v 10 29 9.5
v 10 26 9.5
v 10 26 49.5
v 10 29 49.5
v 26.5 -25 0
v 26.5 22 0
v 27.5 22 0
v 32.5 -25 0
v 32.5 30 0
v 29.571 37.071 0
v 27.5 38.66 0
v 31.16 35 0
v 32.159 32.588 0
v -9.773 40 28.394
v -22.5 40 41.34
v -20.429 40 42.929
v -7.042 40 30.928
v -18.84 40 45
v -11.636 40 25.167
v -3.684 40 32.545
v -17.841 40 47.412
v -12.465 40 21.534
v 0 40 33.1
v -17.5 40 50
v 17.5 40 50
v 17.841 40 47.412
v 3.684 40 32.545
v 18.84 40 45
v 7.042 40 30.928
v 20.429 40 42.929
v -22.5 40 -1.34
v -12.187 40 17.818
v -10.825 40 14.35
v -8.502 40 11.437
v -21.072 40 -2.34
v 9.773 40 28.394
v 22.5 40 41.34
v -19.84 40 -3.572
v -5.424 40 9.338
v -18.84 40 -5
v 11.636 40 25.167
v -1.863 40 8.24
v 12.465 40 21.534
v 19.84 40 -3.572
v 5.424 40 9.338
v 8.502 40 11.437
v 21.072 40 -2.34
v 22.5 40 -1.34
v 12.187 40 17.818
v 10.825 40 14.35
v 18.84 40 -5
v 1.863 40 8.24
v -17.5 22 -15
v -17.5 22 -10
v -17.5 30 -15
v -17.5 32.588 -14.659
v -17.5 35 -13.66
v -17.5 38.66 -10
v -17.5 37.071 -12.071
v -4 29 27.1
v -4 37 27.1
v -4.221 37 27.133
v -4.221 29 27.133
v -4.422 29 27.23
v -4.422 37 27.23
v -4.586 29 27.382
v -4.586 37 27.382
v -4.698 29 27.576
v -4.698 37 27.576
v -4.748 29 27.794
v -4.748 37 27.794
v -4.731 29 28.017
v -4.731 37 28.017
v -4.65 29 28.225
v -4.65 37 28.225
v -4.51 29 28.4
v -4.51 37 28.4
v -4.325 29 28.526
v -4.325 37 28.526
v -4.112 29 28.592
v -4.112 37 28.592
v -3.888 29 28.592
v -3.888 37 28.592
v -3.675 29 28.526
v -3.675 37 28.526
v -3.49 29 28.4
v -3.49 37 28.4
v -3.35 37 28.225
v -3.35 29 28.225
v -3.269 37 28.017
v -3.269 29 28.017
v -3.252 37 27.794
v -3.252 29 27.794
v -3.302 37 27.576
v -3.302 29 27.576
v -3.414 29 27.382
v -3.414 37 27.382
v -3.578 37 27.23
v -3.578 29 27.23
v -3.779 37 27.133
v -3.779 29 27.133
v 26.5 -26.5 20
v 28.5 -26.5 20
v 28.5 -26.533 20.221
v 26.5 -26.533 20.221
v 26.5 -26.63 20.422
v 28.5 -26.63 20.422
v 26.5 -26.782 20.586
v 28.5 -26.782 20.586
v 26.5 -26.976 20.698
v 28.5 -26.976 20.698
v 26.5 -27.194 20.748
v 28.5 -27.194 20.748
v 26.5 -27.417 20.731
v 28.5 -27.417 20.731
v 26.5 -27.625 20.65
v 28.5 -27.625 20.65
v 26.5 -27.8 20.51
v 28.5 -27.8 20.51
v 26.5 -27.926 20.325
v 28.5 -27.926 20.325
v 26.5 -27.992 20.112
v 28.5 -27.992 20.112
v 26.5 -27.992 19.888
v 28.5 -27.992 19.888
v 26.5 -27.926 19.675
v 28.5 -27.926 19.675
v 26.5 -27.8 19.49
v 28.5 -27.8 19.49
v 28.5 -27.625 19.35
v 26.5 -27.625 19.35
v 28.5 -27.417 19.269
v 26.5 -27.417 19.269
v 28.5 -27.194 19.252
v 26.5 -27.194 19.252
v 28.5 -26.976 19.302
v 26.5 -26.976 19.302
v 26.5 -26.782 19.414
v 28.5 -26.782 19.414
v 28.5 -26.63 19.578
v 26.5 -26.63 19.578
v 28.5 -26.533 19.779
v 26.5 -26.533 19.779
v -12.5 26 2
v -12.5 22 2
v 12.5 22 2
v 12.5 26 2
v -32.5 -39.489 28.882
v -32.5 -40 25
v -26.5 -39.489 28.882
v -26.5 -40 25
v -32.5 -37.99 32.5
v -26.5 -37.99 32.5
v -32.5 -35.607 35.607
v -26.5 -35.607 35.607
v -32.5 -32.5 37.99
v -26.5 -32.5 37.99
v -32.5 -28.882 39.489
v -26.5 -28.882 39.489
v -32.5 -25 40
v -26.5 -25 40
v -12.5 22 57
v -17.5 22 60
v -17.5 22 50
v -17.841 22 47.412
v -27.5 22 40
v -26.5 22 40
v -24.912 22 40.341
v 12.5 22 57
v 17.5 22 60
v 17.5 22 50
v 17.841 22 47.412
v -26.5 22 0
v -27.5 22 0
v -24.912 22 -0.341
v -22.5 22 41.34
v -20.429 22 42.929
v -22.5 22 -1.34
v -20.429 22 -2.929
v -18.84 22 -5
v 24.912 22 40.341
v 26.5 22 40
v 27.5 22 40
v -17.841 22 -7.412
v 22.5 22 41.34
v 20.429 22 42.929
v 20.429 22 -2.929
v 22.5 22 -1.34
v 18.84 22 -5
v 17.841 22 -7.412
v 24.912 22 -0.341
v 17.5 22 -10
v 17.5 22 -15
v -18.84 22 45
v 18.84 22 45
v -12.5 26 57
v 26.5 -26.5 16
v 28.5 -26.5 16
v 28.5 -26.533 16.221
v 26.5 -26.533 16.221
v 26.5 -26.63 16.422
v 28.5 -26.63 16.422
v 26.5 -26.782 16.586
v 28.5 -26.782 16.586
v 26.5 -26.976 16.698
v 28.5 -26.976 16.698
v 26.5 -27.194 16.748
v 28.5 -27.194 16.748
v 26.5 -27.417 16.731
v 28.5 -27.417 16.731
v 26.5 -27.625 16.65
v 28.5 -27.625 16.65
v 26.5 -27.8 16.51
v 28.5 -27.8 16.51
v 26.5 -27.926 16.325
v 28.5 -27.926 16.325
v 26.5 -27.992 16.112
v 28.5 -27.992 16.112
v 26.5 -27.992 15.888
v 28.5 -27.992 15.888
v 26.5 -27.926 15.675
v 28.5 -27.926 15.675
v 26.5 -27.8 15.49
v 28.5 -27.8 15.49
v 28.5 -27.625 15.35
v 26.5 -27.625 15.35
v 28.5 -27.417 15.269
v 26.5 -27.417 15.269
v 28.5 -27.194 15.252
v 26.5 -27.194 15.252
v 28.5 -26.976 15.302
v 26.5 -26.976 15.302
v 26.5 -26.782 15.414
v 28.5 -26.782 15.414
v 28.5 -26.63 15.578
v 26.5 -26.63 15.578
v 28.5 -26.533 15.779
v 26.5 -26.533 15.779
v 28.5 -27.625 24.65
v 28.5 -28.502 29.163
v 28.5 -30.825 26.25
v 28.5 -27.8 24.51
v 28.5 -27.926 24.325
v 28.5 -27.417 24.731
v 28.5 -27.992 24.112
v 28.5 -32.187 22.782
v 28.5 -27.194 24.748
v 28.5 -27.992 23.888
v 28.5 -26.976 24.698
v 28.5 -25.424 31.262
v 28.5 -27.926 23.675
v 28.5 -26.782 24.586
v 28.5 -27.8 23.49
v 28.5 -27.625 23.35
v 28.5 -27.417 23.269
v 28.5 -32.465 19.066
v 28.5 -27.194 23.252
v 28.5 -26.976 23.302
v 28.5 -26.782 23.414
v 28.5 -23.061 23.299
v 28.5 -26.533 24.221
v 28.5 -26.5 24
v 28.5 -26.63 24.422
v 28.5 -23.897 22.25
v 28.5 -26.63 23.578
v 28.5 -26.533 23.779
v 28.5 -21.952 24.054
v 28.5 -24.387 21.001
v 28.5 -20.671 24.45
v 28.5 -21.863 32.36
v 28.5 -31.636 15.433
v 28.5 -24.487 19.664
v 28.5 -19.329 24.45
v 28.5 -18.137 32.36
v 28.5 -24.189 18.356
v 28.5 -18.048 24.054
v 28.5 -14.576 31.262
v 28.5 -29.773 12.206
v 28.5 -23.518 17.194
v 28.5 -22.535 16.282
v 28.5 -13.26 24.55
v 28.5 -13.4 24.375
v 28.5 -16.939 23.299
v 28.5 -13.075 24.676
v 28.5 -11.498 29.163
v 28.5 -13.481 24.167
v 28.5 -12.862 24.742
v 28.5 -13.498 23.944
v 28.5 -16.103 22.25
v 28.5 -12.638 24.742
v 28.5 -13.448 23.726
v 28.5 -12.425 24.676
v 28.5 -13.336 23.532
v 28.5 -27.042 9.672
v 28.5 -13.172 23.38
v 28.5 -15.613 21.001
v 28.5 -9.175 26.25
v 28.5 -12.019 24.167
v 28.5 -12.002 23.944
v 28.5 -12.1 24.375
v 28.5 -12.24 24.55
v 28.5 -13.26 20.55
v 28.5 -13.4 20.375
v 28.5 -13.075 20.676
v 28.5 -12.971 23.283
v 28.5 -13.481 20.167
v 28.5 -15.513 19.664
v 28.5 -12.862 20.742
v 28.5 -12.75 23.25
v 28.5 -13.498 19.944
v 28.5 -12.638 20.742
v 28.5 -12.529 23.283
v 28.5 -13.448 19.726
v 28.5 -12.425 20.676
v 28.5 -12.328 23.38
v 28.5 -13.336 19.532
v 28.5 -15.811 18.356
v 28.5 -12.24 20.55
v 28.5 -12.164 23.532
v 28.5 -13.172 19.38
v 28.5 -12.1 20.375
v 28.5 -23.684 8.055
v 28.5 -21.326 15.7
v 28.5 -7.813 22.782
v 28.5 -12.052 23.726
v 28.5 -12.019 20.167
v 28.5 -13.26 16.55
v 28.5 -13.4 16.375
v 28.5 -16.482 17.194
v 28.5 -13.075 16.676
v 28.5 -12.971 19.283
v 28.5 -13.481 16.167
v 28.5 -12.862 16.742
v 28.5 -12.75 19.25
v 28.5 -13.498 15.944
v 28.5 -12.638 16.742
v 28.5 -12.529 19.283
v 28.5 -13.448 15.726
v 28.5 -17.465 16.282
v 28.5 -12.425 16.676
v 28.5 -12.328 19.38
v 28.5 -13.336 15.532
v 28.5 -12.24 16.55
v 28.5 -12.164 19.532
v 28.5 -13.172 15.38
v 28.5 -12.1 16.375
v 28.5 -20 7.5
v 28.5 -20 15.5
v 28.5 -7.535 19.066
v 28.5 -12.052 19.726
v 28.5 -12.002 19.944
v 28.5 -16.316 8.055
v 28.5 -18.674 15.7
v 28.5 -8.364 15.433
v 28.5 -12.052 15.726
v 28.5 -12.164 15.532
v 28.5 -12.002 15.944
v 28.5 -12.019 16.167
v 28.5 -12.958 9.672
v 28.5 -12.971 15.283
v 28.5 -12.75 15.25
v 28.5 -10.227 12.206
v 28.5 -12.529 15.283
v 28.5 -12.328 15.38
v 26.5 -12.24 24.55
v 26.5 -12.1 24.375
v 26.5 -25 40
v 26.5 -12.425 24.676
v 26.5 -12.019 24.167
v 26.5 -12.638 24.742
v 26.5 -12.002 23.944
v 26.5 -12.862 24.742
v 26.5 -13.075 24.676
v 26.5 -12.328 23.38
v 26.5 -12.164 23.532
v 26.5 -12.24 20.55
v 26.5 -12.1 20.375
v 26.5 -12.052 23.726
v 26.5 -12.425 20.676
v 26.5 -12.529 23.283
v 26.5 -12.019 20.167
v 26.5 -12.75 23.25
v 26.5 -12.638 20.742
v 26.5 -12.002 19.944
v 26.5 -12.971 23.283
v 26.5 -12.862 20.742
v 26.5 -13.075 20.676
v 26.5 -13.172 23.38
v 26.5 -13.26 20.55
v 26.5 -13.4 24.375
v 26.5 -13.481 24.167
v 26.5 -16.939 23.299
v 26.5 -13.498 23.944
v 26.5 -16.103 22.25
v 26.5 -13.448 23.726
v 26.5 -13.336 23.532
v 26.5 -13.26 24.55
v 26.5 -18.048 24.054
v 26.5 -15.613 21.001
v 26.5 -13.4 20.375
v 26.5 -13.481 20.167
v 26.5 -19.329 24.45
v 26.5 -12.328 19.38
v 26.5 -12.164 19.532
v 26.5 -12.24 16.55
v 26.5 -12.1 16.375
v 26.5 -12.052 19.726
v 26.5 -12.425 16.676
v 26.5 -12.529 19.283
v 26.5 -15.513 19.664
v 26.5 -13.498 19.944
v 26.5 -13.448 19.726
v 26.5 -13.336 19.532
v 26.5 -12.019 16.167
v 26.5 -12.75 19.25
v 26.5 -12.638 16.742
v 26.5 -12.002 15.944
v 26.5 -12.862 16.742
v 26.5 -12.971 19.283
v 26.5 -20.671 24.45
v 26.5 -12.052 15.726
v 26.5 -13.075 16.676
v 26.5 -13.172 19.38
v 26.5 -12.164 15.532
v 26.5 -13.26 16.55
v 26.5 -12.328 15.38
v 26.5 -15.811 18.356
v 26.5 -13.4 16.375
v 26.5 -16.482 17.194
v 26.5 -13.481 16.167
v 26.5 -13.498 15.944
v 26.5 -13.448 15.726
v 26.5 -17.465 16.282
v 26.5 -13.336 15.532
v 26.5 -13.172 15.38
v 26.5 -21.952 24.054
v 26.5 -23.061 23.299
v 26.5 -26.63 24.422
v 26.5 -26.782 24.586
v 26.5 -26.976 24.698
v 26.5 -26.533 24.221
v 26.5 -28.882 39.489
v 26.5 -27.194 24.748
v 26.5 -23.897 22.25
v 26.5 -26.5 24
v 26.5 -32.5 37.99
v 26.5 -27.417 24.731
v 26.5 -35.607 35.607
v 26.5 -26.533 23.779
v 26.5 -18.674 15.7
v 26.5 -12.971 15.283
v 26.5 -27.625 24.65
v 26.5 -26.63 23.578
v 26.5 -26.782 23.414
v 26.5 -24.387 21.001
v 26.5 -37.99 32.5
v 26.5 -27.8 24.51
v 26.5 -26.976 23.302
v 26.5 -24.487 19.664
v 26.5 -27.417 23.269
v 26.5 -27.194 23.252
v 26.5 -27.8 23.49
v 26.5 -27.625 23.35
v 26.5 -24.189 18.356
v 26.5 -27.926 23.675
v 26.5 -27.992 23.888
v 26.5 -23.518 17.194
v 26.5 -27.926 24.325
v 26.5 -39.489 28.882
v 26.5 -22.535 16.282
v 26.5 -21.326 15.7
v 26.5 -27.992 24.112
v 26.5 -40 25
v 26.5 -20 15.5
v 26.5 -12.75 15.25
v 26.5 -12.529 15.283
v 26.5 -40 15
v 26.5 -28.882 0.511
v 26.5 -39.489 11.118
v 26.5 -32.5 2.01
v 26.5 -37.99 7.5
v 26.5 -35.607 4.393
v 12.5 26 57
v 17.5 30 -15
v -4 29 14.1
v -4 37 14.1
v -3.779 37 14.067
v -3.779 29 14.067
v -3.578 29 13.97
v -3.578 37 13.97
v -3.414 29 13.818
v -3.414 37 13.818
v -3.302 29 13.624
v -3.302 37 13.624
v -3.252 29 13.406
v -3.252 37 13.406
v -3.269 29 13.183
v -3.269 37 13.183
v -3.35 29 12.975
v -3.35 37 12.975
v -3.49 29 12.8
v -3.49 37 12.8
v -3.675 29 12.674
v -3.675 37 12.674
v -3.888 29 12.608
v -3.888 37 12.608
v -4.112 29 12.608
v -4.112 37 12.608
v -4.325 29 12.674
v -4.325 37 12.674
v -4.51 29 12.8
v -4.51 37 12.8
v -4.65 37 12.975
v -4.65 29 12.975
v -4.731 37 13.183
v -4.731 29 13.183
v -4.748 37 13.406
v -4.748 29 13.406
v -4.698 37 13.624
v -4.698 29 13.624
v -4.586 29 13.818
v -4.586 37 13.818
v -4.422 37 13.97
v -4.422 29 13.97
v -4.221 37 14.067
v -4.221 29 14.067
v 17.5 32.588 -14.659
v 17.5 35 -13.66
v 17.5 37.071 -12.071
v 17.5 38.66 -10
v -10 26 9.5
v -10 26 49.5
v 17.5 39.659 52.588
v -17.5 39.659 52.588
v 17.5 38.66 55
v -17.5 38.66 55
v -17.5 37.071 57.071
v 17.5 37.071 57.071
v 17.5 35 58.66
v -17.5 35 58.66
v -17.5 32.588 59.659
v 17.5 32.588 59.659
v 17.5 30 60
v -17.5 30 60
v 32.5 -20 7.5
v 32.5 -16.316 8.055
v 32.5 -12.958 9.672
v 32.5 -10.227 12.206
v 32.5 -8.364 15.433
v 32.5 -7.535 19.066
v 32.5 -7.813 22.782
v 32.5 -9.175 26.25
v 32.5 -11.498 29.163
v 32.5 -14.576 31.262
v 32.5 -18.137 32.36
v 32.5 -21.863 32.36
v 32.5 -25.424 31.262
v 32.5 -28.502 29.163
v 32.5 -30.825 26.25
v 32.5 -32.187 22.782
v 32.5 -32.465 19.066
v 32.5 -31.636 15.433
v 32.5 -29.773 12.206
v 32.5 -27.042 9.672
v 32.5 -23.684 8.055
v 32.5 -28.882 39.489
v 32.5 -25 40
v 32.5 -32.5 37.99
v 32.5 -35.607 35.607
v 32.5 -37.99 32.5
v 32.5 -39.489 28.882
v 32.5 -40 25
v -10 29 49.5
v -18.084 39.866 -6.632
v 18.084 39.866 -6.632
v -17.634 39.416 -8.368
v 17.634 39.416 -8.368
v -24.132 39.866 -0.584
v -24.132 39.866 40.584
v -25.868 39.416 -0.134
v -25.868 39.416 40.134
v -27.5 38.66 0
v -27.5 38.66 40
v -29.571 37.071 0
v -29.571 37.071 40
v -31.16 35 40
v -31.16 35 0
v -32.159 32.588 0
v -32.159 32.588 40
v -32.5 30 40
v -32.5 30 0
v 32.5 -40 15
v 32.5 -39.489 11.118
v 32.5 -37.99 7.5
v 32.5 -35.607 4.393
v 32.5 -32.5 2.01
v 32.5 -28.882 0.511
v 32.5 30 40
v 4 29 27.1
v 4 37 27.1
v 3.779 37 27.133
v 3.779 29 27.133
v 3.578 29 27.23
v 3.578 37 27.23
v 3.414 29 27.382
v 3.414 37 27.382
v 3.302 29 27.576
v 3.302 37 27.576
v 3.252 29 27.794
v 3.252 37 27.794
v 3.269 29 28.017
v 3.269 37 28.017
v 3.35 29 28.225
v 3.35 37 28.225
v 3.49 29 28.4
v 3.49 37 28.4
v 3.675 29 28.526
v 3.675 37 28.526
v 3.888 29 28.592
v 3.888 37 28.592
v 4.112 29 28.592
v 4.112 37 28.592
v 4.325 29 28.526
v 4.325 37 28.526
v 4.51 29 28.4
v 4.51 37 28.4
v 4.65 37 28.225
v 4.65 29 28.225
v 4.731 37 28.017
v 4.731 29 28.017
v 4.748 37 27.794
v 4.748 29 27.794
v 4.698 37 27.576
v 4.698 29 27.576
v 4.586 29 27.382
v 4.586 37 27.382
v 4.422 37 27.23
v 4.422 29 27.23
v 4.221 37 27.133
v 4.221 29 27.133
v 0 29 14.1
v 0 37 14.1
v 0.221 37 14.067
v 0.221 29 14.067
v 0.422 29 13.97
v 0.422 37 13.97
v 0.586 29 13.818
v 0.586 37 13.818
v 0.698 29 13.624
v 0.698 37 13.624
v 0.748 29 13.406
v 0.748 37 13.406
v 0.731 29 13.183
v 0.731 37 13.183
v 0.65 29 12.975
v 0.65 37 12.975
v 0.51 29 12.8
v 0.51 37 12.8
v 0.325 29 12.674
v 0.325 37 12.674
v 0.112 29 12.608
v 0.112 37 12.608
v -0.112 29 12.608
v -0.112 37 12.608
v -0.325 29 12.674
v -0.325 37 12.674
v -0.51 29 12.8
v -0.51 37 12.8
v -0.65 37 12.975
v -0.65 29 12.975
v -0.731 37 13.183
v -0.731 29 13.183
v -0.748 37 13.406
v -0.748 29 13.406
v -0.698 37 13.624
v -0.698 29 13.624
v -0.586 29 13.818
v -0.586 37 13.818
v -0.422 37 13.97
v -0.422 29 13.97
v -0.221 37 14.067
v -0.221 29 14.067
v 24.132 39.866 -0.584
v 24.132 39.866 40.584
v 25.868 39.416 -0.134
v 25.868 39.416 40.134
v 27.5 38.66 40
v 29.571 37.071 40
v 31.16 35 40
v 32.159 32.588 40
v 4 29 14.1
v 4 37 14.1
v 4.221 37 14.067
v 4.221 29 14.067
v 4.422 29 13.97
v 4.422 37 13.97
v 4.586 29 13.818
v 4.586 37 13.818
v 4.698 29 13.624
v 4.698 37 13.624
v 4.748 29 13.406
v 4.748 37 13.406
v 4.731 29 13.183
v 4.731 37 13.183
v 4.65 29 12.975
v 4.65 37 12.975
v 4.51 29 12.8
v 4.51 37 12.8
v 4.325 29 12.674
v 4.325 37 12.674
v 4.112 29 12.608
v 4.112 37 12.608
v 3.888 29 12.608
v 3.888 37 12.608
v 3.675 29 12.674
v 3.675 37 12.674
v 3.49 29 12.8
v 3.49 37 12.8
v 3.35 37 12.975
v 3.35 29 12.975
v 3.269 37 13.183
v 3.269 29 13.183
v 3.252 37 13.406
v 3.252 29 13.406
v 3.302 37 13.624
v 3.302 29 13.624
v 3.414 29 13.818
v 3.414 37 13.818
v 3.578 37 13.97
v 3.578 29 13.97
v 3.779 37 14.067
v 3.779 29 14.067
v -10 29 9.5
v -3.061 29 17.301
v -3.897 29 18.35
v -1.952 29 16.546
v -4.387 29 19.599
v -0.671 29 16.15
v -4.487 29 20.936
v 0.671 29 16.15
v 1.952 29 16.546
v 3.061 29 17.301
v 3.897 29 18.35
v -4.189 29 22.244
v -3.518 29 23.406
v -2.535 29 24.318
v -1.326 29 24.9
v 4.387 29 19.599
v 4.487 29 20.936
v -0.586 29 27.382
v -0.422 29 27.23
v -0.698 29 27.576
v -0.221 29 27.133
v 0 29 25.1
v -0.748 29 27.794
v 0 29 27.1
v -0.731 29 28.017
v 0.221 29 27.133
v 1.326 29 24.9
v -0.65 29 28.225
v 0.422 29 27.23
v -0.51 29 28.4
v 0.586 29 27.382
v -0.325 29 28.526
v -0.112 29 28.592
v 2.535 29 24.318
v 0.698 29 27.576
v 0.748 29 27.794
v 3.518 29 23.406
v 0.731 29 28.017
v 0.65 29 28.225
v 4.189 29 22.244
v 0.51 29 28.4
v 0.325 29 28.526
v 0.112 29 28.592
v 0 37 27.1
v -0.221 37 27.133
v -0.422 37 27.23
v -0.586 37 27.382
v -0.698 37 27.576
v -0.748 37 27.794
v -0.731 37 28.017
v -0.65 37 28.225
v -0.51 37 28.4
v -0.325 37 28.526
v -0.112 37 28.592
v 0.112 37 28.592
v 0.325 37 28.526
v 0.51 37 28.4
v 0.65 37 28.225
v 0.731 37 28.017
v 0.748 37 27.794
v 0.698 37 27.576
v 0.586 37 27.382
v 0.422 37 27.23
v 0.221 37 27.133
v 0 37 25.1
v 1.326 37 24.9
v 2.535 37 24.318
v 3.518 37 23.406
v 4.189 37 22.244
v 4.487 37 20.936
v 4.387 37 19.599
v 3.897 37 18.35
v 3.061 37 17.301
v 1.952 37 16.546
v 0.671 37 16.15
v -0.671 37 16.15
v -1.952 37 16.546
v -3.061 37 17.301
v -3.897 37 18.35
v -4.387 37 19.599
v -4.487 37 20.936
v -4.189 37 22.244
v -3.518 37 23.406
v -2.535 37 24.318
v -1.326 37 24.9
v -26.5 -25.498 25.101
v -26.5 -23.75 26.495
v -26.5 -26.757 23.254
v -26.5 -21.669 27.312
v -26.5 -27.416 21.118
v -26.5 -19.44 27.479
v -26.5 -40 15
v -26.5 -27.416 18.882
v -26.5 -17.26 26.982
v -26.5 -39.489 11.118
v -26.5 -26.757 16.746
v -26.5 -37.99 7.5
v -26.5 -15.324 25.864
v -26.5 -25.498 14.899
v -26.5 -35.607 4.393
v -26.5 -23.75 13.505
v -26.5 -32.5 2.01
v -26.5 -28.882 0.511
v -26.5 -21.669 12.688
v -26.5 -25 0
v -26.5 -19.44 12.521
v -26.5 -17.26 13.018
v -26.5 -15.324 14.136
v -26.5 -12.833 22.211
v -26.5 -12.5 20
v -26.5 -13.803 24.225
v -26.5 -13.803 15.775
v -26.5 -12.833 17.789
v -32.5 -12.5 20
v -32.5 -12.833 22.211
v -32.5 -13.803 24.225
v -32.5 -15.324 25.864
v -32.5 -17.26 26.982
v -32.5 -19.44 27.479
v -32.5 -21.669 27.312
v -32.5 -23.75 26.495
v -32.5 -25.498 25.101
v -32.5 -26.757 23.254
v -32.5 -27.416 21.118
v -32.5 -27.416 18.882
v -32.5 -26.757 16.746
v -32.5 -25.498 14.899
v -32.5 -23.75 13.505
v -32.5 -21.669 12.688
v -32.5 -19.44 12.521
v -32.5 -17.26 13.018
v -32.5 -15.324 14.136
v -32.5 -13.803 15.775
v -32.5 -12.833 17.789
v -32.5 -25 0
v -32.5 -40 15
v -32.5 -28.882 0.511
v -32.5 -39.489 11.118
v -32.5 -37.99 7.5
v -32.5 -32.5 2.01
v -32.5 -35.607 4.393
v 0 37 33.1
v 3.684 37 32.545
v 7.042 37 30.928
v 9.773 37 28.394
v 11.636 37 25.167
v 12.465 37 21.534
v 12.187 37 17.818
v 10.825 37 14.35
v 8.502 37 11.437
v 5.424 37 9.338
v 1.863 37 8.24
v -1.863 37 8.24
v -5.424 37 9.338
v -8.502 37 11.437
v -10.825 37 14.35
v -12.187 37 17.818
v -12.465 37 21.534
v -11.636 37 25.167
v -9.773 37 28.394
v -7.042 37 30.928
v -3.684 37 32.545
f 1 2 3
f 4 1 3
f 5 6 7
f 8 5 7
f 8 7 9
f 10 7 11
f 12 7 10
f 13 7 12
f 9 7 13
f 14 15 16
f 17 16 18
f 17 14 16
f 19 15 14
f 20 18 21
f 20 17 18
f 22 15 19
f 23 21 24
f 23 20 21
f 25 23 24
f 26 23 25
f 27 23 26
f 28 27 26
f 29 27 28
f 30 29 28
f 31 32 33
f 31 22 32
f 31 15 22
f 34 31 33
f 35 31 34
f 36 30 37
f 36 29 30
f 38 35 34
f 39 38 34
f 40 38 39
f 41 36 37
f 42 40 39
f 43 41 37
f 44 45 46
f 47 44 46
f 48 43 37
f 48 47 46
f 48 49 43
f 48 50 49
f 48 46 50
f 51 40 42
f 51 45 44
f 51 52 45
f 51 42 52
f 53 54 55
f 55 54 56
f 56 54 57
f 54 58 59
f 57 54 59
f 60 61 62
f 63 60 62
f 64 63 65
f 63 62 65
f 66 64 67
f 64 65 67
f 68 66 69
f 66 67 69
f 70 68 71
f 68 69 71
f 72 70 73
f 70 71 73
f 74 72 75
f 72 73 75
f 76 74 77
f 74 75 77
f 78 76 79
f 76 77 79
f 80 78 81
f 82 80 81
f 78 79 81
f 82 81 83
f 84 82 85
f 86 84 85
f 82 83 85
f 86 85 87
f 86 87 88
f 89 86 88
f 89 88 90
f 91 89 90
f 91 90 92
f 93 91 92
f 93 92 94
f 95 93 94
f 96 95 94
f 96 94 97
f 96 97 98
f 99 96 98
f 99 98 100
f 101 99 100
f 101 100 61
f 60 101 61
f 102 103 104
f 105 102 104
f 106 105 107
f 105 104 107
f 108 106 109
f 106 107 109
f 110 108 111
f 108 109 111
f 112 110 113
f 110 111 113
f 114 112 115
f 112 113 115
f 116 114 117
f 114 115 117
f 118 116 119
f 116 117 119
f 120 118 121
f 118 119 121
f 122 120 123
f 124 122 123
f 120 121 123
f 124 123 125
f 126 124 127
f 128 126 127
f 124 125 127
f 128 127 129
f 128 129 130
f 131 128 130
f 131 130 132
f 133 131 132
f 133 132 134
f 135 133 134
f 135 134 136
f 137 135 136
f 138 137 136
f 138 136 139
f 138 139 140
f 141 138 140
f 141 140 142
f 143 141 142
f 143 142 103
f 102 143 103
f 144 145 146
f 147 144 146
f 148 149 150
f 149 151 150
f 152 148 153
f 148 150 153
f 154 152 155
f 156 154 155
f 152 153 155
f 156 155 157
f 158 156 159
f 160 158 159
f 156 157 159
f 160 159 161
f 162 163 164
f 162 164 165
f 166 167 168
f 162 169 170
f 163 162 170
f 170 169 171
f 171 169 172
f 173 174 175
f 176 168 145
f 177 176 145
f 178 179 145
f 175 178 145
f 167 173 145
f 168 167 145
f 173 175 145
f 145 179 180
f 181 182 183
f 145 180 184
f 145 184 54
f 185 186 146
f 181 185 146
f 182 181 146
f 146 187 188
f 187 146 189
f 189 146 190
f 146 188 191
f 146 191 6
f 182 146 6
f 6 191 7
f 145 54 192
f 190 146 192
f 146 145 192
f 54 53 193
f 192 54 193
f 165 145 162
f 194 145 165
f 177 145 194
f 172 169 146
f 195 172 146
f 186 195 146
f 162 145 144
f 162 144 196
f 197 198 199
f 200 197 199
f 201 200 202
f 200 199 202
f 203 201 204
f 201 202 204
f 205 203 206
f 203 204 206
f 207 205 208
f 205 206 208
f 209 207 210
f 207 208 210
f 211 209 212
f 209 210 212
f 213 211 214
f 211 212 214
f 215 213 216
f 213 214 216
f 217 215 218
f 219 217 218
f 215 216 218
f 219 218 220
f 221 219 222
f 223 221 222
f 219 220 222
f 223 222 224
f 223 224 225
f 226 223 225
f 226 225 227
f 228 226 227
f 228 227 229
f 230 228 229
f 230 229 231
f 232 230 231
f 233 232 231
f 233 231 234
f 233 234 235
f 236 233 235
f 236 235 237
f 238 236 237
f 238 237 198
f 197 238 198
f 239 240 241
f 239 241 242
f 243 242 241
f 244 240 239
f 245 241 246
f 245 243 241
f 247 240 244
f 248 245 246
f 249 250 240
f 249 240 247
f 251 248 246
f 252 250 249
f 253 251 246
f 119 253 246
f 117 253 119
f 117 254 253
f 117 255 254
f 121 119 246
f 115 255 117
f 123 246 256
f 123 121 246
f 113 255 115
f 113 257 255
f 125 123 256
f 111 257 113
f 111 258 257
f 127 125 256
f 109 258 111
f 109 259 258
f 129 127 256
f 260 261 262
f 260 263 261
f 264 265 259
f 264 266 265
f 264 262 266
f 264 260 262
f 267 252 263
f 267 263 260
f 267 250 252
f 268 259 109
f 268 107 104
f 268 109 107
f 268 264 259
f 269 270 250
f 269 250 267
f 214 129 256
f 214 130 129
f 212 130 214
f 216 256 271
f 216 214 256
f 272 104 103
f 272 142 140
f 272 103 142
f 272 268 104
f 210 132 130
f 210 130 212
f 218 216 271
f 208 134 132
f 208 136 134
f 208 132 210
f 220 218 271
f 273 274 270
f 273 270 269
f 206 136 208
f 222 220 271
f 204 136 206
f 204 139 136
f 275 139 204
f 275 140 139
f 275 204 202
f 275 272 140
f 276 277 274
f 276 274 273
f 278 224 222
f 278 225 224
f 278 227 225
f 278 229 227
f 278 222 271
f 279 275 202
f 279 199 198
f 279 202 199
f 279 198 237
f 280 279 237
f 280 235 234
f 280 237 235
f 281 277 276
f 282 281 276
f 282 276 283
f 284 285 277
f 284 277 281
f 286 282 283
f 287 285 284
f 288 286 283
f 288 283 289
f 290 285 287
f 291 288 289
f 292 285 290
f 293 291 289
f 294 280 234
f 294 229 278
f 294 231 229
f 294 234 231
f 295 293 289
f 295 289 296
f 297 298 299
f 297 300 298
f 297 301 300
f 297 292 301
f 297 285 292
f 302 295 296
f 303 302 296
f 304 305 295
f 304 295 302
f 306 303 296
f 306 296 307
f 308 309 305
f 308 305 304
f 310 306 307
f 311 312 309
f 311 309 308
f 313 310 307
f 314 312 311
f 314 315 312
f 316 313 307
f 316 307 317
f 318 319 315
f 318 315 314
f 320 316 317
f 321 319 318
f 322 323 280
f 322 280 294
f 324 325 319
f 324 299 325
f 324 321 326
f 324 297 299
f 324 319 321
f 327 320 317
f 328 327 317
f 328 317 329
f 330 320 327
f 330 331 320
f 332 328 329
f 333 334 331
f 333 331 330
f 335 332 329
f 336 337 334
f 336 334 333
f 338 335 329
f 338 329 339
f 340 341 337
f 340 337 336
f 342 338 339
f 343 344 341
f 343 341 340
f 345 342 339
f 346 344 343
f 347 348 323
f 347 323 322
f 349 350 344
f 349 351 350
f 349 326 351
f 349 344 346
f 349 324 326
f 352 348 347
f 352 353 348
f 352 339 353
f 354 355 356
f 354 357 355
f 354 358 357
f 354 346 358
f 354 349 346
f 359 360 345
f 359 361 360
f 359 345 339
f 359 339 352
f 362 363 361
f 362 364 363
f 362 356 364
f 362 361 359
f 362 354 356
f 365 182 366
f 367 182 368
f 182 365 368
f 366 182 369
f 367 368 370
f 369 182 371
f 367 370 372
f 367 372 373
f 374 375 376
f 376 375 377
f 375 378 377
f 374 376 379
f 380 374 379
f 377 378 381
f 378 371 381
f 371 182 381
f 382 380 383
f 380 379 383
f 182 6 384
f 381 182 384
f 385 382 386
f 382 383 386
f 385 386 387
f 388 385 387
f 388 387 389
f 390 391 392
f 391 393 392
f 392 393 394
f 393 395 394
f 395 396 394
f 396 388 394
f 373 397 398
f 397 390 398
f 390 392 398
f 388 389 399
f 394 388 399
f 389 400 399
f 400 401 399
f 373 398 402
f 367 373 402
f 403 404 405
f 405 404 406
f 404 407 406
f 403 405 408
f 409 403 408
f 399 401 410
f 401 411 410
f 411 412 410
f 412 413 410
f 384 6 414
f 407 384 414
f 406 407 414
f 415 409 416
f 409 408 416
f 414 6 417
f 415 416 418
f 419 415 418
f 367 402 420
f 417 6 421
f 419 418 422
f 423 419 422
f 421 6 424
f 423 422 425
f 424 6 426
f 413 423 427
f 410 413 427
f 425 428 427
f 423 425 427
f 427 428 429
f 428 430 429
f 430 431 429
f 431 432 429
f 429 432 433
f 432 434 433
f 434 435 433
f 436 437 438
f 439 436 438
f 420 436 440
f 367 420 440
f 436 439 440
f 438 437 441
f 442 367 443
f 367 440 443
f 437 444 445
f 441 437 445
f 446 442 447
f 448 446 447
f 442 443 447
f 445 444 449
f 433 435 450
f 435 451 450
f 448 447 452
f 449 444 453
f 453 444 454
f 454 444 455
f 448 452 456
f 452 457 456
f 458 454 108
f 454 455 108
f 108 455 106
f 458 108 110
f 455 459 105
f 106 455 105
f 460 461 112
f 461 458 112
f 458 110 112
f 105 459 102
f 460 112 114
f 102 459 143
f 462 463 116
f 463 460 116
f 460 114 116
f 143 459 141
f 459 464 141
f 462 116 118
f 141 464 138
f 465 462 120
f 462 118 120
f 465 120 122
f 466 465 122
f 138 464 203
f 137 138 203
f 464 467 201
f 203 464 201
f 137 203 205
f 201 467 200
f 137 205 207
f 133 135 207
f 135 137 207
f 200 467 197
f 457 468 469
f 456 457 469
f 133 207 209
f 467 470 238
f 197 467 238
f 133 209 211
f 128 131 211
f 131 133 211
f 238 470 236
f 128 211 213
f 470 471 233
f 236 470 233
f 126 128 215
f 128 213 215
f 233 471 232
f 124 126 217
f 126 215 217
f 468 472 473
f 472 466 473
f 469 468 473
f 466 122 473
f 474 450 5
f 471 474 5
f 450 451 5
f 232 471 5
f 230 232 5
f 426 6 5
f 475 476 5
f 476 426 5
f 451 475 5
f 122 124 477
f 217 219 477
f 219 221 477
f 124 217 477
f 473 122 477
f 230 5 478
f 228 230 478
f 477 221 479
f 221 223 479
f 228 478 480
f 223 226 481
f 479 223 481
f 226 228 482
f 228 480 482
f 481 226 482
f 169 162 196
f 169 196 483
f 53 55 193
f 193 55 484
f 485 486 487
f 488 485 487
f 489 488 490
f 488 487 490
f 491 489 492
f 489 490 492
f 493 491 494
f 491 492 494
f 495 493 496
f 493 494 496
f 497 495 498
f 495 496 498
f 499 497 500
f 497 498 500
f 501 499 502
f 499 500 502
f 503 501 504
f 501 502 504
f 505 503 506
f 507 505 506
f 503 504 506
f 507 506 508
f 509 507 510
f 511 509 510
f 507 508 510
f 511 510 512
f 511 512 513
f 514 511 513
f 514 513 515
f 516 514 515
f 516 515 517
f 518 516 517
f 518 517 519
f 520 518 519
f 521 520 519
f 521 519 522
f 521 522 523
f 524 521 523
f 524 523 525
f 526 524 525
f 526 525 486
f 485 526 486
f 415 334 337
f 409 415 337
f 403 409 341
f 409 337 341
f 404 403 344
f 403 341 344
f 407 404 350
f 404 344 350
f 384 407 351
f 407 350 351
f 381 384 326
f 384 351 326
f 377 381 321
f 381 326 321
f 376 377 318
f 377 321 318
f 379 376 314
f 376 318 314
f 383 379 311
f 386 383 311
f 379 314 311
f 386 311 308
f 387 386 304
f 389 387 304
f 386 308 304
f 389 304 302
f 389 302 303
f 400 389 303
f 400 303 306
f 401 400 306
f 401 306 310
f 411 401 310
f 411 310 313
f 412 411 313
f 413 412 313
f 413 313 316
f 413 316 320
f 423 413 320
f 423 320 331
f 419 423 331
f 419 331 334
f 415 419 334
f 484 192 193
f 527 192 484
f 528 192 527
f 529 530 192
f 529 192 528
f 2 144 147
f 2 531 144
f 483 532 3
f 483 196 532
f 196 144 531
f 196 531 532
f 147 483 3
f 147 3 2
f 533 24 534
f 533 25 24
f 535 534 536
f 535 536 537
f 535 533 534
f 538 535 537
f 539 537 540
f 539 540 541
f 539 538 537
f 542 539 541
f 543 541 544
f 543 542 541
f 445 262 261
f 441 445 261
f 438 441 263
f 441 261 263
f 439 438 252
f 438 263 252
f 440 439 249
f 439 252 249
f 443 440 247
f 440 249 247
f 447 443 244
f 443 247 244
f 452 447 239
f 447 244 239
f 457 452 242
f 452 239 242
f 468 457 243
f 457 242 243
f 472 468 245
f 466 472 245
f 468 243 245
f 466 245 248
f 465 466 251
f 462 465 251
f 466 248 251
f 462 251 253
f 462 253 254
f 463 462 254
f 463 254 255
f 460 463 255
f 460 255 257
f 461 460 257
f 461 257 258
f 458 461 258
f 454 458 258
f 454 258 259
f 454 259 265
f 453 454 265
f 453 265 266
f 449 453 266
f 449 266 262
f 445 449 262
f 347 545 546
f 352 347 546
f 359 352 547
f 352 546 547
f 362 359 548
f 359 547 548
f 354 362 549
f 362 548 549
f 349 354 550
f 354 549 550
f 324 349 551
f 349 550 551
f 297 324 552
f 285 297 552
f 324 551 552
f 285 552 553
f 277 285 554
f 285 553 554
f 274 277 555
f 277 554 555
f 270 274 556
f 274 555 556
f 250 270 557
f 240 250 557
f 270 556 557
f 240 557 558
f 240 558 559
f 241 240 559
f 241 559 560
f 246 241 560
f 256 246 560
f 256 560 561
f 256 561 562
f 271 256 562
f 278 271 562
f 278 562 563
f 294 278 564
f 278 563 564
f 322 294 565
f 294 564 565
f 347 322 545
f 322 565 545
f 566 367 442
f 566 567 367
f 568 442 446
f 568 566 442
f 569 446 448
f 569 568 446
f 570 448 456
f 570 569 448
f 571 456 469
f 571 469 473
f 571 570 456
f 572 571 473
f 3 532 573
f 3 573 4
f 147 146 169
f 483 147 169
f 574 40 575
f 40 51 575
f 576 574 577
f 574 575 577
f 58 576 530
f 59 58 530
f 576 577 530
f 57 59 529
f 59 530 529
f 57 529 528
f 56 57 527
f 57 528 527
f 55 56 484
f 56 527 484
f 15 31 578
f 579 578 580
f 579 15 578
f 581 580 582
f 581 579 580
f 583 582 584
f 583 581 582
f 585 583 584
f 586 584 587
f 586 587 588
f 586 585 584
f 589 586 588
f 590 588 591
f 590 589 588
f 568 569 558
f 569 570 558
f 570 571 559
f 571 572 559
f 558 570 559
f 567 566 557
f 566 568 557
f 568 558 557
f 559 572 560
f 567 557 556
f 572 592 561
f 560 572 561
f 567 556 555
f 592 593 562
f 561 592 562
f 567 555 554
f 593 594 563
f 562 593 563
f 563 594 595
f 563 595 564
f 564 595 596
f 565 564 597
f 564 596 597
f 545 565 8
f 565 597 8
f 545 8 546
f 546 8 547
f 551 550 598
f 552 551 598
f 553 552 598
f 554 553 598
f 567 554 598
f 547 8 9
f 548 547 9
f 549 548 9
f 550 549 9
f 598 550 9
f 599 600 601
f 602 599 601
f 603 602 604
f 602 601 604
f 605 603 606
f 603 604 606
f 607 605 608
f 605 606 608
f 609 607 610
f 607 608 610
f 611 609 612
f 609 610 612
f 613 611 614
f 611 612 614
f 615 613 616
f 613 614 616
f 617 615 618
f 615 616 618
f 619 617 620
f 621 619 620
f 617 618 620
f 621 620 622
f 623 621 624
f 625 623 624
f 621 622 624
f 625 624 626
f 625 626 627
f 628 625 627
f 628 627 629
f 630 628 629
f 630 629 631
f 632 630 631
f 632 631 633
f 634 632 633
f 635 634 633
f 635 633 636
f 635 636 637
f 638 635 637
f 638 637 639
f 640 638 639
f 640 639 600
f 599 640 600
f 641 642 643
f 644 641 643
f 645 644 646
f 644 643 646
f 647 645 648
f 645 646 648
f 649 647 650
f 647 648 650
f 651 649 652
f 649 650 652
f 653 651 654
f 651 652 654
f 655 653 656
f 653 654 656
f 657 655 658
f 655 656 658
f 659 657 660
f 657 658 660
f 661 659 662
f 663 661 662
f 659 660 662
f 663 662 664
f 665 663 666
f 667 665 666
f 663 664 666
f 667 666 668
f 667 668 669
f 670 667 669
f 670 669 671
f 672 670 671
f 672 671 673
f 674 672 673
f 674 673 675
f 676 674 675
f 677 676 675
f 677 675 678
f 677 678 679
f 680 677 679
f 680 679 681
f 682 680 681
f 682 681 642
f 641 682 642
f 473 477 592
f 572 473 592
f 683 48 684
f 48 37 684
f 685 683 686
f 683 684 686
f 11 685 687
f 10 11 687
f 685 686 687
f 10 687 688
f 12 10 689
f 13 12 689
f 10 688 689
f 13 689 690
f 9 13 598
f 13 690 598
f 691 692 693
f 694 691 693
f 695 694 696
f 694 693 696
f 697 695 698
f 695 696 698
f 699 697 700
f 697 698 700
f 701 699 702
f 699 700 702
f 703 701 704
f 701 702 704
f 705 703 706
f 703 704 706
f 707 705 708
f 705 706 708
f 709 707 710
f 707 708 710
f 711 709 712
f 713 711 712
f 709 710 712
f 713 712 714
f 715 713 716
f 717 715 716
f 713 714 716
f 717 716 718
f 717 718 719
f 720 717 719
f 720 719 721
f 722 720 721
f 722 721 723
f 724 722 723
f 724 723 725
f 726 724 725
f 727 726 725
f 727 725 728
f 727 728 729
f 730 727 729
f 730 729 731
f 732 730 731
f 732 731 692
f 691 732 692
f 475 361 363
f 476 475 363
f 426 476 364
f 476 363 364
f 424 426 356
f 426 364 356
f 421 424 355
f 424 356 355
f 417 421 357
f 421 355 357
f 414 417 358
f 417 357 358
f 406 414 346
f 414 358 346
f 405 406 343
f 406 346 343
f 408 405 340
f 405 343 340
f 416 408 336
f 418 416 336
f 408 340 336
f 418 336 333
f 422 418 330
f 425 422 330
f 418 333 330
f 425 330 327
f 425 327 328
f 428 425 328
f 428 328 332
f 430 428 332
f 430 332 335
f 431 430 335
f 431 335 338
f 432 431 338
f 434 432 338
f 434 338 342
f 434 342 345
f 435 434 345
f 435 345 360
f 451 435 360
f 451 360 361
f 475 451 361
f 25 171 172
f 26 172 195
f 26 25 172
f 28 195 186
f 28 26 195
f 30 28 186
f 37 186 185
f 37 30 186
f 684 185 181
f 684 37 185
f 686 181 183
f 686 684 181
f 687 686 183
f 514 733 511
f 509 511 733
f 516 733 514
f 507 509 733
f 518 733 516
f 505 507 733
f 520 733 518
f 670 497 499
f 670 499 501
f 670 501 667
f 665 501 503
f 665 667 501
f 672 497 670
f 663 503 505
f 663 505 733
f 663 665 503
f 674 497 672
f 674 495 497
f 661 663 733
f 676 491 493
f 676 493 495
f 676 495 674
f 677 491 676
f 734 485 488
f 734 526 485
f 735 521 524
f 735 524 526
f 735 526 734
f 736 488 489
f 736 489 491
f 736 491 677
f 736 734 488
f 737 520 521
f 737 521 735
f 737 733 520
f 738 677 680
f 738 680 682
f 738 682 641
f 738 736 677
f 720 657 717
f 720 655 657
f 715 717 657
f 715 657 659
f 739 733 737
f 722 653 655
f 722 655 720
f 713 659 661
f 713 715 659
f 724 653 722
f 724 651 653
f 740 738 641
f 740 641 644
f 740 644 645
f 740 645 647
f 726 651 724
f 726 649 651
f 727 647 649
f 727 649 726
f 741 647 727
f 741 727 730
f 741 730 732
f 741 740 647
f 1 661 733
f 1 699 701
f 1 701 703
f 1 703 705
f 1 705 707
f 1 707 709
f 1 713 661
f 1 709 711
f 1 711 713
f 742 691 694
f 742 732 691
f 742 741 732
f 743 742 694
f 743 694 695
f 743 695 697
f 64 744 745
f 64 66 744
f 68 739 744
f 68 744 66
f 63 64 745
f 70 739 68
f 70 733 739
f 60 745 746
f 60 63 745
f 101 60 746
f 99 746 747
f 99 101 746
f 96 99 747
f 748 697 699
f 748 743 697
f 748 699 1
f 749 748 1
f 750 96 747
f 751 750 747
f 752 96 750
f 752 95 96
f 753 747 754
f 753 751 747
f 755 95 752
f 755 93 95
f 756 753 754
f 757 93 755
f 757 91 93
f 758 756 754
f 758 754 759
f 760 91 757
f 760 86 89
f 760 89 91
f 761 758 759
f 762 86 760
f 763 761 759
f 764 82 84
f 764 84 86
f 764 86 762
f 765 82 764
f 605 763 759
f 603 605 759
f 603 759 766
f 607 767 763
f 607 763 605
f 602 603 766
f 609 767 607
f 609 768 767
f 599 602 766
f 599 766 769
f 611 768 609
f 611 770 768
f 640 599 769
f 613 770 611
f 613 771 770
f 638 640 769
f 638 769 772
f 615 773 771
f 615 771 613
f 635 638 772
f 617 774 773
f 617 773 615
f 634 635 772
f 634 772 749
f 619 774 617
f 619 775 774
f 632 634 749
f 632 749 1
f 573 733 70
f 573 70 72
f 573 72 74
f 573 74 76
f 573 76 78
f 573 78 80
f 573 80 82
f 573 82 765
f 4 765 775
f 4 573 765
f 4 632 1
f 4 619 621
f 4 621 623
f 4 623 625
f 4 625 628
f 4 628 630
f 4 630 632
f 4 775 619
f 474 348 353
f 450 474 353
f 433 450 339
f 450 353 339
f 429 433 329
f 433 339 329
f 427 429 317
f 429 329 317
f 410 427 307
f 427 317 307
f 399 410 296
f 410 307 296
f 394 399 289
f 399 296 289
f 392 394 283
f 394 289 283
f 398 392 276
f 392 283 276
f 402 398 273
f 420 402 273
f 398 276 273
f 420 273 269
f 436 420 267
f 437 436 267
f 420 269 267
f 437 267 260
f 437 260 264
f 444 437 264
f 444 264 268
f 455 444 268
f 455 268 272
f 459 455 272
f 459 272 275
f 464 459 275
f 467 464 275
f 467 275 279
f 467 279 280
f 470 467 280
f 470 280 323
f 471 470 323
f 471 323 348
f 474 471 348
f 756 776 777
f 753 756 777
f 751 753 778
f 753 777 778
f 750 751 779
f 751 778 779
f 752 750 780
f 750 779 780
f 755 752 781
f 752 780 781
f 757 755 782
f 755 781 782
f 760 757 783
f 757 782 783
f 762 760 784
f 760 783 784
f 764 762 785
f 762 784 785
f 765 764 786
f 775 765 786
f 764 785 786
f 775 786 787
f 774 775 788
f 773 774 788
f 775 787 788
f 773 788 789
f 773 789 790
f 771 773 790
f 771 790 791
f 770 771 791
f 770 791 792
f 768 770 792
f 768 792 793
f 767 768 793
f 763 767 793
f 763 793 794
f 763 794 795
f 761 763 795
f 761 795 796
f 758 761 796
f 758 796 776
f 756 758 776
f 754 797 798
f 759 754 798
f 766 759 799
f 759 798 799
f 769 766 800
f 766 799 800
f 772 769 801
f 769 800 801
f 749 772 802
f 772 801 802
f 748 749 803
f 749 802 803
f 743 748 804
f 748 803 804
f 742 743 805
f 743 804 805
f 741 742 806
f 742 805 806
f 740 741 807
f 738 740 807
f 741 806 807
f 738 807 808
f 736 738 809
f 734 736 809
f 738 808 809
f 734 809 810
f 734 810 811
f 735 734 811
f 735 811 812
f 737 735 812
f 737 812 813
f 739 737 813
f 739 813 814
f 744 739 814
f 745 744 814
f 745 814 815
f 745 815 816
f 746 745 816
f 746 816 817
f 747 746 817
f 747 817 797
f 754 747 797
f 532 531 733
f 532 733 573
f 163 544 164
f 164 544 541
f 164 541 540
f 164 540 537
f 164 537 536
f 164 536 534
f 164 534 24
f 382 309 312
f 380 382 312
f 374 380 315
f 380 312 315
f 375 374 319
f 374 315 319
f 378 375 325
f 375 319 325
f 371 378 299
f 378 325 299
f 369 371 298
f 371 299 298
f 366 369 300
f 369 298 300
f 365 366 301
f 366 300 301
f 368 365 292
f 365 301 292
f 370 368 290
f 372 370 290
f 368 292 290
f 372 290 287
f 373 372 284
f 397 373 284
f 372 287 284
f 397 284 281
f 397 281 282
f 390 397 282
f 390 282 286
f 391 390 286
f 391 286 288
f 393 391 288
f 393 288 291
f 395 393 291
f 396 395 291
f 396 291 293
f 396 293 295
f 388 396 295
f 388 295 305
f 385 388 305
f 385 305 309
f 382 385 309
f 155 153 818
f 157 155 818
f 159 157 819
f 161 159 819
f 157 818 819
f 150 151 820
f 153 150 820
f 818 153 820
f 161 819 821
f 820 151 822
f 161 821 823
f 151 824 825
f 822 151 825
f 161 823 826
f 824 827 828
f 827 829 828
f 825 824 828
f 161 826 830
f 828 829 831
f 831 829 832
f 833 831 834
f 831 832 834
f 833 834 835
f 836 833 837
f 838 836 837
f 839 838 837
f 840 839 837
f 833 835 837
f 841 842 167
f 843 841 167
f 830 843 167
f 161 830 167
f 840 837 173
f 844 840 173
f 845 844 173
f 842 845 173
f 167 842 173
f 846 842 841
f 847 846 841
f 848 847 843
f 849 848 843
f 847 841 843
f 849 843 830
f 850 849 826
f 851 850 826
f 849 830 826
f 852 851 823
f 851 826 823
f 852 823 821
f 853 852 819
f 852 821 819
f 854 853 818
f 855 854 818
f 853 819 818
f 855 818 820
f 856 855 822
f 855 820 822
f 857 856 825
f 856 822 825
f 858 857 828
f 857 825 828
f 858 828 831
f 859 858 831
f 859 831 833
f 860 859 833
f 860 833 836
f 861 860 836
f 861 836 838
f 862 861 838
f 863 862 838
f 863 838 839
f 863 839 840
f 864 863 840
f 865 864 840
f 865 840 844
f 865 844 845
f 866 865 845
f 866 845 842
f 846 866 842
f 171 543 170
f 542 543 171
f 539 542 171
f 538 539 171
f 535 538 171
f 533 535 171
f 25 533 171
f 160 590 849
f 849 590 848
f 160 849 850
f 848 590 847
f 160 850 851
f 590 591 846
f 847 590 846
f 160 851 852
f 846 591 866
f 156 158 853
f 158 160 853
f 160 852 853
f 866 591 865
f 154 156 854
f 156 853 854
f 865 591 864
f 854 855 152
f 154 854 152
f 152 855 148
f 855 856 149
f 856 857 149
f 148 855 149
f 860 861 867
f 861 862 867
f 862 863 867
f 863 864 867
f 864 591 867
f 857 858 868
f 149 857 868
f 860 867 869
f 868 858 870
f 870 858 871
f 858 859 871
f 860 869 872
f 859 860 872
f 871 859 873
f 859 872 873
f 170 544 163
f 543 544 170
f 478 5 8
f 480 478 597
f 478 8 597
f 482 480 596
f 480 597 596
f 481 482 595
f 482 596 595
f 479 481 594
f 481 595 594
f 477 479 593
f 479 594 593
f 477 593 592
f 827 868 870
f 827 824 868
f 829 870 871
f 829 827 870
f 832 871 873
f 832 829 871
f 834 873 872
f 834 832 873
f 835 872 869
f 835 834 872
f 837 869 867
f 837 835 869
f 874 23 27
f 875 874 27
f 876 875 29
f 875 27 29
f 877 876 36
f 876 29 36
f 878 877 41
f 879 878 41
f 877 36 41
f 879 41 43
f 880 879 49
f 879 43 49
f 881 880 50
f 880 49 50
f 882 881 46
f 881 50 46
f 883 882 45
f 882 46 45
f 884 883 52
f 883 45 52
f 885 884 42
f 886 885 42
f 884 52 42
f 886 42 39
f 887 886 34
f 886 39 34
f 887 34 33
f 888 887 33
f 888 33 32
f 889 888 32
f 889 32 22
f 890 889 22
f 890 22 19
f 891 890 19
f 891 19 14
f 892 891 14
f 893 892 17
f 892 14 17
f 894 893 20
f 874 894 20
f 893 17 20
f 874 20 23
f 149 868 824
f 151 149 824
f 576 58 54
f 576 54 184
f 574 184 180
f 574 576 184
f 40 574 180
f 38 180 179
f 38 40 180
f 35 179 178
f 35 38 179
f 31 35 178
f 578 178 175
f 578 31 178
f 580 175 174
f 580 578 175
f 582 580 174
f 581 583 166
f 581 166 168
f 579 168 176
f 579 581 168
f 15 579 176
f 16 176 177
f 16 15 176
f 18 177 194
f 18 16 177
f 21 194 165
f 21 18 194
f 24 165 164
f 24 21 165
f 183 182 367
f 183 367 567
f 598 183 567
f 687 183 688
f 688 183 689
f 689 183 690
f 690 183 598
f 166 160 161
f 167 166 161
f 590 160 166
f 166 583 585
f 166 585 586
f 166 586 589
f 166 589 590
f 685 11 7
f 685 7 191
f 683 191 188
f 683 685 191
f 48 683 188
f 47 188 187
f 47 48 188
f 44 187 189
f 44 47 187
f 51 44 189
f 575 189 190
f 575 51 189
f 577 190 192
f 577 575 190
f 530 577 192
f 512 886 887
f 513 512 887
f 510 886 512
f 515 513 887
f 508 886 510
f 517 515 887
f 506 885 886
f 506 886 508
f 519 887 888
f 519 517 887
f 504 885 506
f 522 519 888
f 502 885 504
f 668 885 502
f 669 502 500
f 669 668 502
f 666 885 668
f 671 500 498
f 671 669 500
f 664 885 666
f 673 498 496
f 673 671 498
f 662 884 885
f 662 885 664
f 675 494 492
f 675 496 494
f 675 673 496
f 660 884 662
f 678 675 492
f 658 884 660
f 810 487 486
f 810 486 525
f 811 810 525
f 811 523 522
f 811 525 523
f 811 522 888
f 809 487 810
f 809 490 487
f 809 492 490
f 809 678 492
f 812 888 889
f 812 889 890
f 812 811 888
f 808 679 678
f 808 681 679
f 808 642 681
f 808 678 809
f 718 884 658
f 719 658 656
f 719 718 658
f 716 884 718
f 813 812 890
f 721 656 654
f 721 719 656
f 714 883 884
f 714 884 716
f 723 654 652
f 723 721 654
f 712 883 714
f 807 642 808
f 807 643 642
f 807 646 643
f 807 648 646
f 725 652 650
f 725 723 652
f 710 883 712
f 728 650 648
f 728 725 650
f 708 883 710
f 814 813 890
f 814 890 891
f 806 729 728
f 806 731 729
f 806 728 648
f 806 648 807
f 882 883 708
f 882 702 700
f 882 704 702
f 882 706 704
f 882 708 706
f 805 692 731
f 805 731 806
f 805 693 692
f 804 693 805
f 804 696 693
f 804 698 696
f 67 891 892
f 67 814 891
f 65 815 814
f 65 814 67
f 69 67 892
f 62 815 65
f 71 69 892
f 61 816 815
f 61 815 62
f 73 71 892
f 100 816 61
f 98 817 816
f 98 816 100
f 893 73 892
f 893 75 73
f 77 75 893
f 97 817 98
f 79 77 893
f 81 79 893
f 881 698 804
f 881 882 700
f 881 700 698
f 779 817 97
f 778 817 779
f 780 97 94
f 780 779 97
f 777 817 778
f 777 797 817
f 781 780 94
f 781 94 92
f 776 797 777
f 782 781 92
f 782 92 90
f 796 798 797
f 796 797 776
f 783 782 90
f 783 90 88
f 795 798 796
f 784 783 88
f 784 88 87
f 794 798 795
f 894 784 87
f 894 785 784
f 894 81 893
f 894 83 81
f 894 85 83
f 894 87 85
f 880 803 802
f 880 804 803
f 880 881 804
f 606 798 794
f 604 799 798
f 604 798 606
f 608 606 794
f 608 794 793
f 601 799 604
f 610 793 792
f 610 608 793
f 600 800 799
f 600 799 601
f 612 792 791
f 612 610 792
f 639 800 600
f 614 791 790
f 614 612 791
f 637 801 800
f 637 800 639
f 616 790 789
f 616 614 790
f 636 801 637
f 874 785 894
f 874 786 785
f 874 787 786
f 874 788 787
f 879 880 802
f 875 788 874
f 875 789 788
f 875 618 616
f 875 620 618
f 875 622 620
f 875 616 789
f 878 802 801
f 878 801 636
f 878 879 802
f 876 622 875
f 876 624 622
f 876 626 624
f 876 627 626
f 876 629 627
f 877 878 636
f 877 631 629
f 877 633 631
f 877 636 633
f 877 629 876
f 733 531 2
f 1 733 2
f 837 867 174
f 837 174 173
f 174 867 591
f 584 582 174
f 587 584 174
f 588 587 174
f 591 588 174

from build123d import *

# Parameters (mm, degrees)
BOSS_EXTRUDE1_DEPTH = 40
SKETCH2_R           = 12.5
CUT_EXTRUDE1_DEPTH  = 4
SKETCH3_R           = 0.75
SKETCH3_R_2         = 4.5
CUT_EXTRUDE2_DEPTH  = 4
SKETCH4_R           = 7.5
CUT_EXTRUDE3_DEPTH  = 14
SKETCH7_W           = 35
SKETCH7_H           = 15
SKETCH7_H_2         = 20
BOSS_EXTRUDE2_DEPTH = 18
SKETCH8_W           = 25
SKETCH8_H           = 55
CUT_EXTRUDE7_DEPTH  = 4
SKETCH9_W           = 20
SKETCH9_H           = 40
CUT_EXTRUDE8_DEPTH  = 3
SKETCH10_R          = 12.5
CUT_EXTRUDE9_DEPTH  = 3
SKETCH11_R          = 4.5
SKETCH11_R_2        = 0.75
CUT_EXTRUDE10_DEPTH = 13
FILLET1_R           = 15
FILLET2_R           = 10
FILLET3_R           = 10


with BuildPart() as part:
    # Sketch1 → Boss-Extrude1 (new body)
    with BuildSketch(Plane.XY):
        Polygon((-26.5, -40), (-26.5, 22), (26.5, 22), (26.5, -40), (32.5, -40), (32.5, 40), (-32.5, 40), (-32.5, -40), align=None)
    extrude(amount=BOSS_EXTRUDE1_DEPTH)

    # Sketch2 → Cut-Extrude1 (cut)
    with BuildSketch(Plane(origin=(32.5, 0, 0), x_dir=(0, 0, -1), z_dir=(1, 0, 0))):
        with Locations((-20, -20)):
            Circle(SKETCH2_R)
    extrude(amount=-CUT_EXTRUDE1_DEPTH, mode=Mode.SUBTRACT)

    # Sketch3 → Cut-Extrude2 (cut)
    with BuildSketch(Plane(origin=(28.5, 0, 0), x_dir=(0, 0, -1), z_dir=(1, 0, 0))):
        with Locations((-20, -12.75)):
            Circle(SKETCH3_R)
        with Locations((-16, -12.75)):
            Circle(SKETCH3_R)
        with Locations((-24, -12.75)):
            Circle(SKETCH3_R)
        with Locations((-20, -20)):
            Circle(SKETCH3_R_2)
        with Locations(Location((-16, -27.25, 0), (0, 0, 90))):
            Circle(SKETCH3_R)
        with Locations(Location((-20, -27.25, 0), (0, 0, 90))):
            Circle(SKETCH3_R)
        with Locations(Location((-24, -27.25, 0), (0, 0, 90))):
            Circle(SKETCH3_R)
    extrude(amount=-CUT_EXTRUDE2_DEPTH, mode=Mode.SUBTRACT)

    # Sketch4 → Cut-Extrude3 (cut)
    with BuildSketch(Plane(origin=(-26.5, 0, 0), x_dir=(0, 0, -1), z_dir=(1, 0, 0))):
        with Locations(Location((-20, -20, 0), (0, 0, 90))):
            Circle(SKETCH4_R)
    extrude(amount=-CUT_EXTRUDE3_DEPTH, mode=Mode.SUBTRACT)

    # Sketch7 → Boss-Extrude2 (add)
    with BuildSketch(Plane(origin=(0, 40, 0), x_dir=(1, 0, 0), z_dir=(0, 1, 0))):
        with Locations((0, 7.5)):
            Rectangle(SKETCH7_W, SKETCH7_H)
        with Locations((0, -50)):
            Rectangle(SKETCH7_W, SKETCH7_H_2)
    extrude(amount=-BOSS_EXTRUDE2_DEPTH)

    # Sketch8 → Cut-Extrude7 (cut)
    with BuildSketch(Plane.XZ.offset(-22)):
        with Locations((0, 29.5)):
            Rectangle(SKETCH8_W, SKETCH8_H)
    extrude(amount=-CUT_EXTRUDE7_DEPTH, mode=Mode.SUBTRACT)

    # Sketch9 → Cut-Extrude8 (cut)
    with BuildSketch(Plane.XZ.offset(-26)):
        with Locations((0, 29.5)):
            Rectangle(SKETCH9_W, SKETCH9_H)
    extrude(amount=-CUT_EXTRUDE8_DEPTH, mode=Mode.SUBTRACT)

    # Sketch10 → Cut-Extrude9 (cut)
    with BuildSketch(Plane(origin=(0, 40, 0), x_dir=(1, 0, 0), z_dir=(0, 1, 0))):
        with Locations(Location((0, -20.6, 0), (0, 0, 270))):
            Circle(SKETCH10_R)
    extrude(amount=-CUT_EXTRUDE9_DEPTH, mode=Mode.SUBTRACT)

    # Sketch11 → Cut-Extrude10 (cut)
    with BuildSketch(Plane(origin=(0, 37, 0), x_dir=(1, 0, 0), z_dir=(0, 1, 0))):
        with Locations(Location((0, -20.6, 0), (0, 0, 270))):
            Circle(SKETCH11_R)
        with Locations(Location((0, -13.35, 0), (0, 0, 270))):
            Circle(SKETCH11_R_2)
        with Locations(Location((4, -13.35, 0), (0, 0, 270))):
            Circle(SKETCH11_R_2)
        with Locations(Location((-4, -13.35, 0), (0, 0, 270))):
            Circle(SKETCH11_R_2)
        with Locations(Location((4, -27.85, 0), (0, 0, 90))):
            Circle(SKETCH11_R_2)
        with Locations(Location((0, -27.85, 0), (0, 0, 90))):
            Circle(SKETCH11_R_2)
        with Locations(Location((-4, -27.85, 0), (0, 0, 90))):
            Circle(SKETCH11_R_2)
    extrude(amount=-CUT_EXTRUDE10_DEPTH, mode=Mode.SUBTRACT)

    # Fillet1
    fillet1_edges = [part.edges().sort_by_distance(p)[0] for p in [
        (-29.5, -40, 0),
        (-29.5, -40, 40),
        (29.5, -40, 40),
        (29.5, -40, 0),
    ]]
    fillet(fillet1_edges, radius=FILLET1_R)

    # Fillet2
    # the kernel refuses this fillet: 10 mm, written as the material it adds along each edge
    with BuildSketch(Plane(origin=(-17.5, 40, 0), x_dir=(-1, 0, 0), z_dir=(0, -1, 0)), Plane(origin=(17.5, 40, 0), x_dir=(0, 0, -1), z_dir=(0, -1, 0))) as fillet2_piece_1:
        with BuildLine():
            CenterArc((FILLET2_R, FILLET2_R), FILLET2_R, 180, 90)
            Line((0, FILLET2_R), (0, 0))
            Line((0, 0), (FILLET2_R, 0))
        make_face()
    extrude(amount=18)
    with BuildSketch(Plane(origin=(-17.5, 40, 40), x_dir=(-1, 0, 0), z_dir=(0, -1, 0)), Plane(origin=(17.5, 40, 40), x_dir=(0, 0, 1), z_dir=(0, -1, 0))) as fillet2_piece_2:
        with BuildLine():
            CenterArc((FILLET2_R, -FILLET2_R), FILLET2_R, 90, 90)
            Line((0, -FILLET2_R), (0, 0))
            Line((0, 0), (FILLET2_R, 0))
        make_face()
    extrude(amount=18)

    # Fillet3
    fillet3_edges = [part.edges().sort_by_distance(p)[0] for p in [
        (0, 40, -15),
        (0, 40, 60),
        (32.5, 40, 20),
        (-32.5, 40, 20),
    ]]
    fillet(fillet3_edges, radius=FILLET3_R)


solid = part.part
